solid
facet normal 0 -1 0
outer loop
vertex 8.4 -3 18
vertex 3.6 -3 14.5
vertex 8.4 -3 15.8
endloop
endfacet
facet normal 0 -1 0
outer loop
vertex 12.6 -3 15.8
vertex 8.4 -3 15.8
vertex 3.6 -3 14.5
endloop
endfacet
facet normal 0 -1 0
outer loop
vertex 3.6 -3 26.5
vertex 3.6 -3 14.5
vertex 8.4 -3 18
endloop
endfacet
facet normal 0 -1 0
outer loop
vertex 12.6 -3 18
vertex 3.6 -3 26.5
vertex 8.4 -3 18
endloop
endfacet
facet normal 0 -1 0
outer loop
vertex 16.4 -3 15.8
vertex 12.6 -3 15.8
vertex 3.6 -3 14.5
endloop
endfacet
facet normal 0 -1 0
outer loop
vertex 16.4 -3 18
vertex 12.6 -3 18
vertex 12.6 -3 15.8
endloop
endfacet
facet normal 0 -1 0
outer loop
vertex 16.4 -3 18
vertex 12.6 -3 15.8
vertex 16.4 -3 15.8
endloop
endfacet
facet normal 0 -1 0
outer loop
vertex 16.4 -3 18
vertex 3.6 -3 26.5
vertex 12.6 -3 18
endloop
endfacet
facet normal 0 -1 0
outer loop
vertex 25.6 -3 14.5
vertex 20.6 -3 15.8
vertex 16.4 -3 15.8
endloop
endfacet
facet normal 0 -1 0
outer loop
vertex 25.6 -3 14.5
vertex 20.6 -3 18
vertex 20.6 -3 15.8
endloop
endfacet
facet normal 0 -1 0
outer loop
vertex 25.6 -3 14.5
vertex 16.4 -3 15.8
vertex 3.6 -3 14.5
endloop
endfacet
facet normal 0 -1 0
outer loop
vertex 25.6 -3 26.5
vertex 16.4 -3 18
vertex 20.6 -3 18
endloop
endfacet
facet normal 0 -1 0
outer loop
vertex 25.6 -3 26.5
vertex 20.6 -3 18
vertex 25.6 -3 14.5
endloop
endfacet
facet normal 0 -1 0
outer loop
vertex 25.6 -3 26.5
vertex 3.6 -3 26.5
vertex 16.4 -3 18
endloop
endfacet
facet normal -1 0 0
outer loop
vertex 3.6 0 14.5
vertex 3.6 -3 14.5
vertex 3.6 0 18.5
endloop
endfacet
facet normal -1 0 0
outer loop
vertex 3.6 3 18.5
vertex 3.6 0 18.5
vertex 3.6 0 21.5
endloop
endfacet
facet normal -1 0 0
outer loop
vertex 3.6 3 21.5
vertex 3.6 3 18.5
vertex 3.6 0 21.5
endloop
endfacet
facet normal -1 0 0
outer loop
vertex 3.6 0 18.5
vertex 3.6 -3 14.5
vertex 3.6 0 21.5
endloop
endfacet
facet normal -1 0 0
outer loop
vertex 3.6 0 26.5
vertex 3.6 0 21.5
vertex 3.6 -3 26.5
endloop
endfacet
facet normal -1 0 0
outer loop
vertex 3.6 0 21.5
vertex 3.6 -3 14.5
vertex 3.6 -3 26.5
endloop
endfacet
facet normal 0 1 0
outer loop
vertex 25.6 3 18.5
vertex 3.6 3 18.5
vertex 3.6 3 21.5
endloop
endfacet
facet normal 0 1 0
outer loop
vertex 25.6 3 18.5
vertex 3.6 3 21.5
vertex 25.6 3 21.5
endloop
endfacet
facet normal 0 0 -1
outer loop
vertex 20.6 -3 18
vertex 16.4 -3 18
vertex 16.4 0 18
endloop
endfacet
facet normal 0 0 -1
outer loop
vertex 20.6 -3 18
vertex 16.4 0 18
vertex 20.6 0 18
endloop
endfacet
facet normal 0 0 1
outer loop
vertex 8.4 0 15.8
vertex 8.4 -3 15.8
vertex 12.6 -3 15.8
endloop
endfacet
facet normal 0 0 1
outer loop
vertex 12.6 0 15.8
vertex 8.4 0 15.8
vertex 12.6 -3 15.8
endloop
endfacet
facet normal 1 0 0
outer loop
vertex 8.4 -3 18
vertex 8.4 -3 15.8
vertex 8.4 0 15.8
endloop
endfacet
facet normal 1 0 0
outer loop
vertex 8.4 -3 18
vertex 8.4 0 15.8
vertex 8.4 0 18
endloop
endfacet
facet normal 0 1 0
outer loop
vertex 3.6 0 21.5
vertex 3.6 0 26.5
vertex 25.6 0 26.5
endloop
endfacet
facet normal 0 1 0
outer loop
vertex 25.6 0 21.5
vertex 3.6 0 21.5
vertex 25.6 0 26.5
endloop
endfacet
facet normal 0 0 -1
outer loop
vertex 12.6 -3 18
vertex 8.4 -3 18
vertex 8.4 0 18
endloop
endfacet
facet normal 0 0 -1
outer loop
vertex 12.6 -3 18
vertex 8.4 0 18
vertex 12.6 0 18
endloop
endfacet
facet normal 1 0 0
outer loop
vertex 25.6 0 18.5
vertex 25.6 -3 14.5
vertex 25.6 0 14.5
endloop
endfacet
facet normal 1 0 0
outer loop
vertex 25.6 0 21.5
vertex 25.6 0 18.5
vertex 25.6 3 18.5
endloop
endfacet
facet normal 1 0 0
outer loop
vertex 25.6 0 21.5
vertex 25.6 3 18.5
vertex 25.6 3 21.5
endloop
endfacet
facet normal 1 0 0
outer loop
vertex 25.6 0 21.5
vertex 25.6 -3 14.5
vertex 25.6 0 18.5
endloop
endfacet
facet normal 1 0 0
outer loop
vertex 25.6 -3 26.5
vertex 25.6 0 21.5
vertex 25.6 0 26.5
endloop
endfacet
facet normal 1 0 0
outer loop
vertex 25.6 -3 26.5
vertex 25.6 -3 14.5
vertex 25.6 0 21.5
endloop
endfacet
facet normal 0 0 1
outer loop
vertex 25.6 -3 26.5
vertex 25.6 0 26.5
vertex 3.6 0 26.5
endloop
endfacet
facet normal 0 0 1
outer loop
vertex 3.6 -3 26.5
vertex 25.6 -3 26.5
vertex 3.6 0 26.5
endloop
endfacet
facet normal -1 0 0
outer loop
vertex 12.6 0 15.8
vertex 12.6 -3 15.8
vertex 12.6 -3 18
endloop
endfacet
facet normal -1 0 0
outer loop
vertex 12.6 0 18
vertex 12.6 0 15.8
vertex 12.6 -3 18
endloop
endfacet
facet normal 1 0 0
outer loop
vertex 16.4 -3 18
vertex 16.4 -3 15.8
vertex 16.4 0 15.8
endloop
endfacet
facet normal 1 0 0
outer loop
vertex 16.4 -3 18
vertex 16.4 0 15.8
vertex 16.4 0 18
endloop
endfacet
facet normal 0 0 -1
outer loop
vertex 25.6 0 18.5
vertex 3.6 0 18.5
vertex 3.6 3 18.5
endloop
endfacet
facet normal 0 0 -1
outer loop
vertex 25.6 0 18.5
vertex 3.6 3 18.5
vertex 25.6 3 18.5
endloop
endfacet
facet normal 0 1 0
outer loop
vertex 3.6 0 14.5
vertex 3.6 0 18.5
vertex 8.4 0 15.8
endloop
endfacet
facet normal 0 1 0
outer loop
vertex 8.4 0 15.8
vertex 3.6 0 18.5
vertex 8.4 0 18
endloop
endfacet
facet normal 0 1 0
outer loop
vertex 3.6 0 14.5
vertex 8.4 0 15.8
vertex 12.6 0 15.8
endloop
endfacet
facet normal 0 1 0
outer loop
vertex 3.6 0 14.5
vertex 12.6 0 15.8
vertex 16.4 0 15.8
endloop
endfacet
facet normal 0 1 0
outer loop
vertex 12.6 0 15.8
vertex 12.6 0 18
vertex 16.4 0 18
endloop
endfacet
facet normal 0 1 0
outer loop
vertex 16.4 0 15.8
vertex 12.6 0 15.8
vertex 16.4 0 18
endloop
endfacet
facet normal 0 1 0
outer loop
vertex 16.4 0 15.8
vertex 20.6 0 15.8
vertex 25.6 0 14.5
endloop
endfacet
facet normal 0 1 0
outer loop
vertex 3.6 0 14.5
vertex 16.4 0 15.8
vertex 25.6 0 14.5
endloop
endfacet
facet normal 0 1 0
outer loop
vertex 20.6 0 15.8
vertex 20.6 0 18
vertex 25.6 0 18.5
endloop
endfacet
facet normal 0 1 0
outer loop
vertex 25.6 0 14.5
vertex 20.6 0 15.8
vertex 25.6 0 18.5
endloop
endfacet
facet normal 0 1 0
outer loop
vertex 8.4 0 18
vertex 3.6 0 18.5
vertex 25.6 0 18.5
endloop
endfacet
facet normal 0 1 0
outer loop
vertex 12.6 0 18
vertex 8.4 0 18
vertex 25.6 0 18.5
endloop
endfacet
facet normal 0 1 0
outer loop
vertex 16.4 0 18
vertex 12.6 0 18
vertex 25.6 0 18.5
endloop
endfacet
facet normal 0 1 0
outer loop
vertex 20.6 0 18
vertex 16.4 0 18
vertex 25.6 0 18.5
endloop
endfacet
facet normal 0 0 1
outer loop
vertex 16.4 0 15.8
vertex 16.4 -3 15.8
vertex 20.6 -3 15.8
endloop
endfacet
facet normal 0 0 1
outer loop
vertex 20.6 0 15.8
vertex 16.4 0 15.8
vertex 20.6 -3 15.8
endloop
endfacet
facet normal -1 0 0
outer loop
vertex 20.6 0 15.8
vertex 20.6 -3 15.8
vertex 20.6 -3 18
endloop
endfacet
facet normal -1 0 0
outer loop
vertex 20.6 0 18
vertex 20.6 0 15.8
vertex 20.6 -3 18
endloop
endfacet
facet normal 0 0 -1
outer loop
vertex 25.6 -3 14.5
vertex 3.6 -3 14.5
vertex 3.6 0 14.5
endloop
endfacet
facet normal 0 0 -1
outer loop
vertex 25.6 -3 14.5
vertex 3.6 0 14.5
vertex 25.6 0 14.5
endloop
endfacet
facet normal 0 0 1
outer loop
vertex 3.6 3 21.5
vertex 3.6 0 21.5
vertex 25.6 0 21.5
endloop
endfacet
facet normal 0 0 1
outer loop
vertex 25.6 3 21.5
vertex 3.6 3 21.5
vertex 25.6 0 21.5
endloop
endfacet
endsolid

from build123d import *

# Parameters (mm, degrees)
SKETCH_232_W          = 210
SKETCH_232_H          = 53
EXTRUDE_1_DEPTH       = 50
SKETCH_3_W            = 200
SKETCH_3_H            = 43
CUT_EXTRUDE_1_DEPTH   = 45
SKETCH_4_R            = 3.5
EXTRUDE_2_DEPTH       = 2
EXTRUDE_2_TAPER       = 1
FILLET_2_R            = 0.5
SKETCH_4_5_R          = 3.5
EXTRUDE_3_DEPTH       = 2
SKETCH_4_6_R          = 3.5
EXTRUDE_4_DEPTH       = 2
SKETCH_4_7_R          = 3.5
EXTRUDE_5_DEPTH       = 2
FILLET_3_R            = 0.5
FILLET_4_R            = 0.5
FILLET_5_R            = 0.5
SKETCH_7_R            = 6
CUT_EXTRUDE_2_DEPTH   = 14
CUT_EXTRUDE_2_DRAFT   = -5
FILLET_6_R            = 2
SKETCH_8_R            = 7
EXTRUDE_6_DEPTH       = 7
EXTRUDE_6_TAPER       = 5
SKETCH_9_R            = 5.15
CUT_EXTRUDE_3_DEPTH   = 7
CUT_EXTRUDE_3_DRAFT   = 5
SKETCH_10_W           = 29.4
SKETCH_10_H           = 26.3
CUT_EXTRUDE_4_DEPTH   = 5
SKETCH_13_W           = 39.2
SKETCH_13_H           = 27.5
CUT_EXTRUDE_5_DEPTH   = 2
SKETCH_14_W           = 6
SKETCH_14_H           = 6
CUT_EXTRUDE_6_DEPTH   = 5
FILLET_7_R            = 2
EXTRUDE_8_DEPTH       = 3
SKETCH_18_W           = 200
SKETCH_18_H           = 43
SKETCH_18_W_2         = 194
SKETCH_18_H_2         = 37
EXTRUDE_4672_DEPTH    = 3
SKETCH_21_W           = 4.2
SKETCH_21_H           = 2.2
CUT_EXTRUDE_7_DEPTH   = 3
SKETCH_23_OUTSIDE_W   = 255.334
SKETCH_23_OUTSIDE_H   = 98.334
SKETCH_23_OUTSIDE_W_2 = 22
SKETCH_23_OUTSIDE_H_2 = 12
CUT_EXTRUDE_8_DEPTH   = 6


with BuildPart() as part:
    # Sketch 232 → Бобышка-Вытянуть1 (new body)
    with BuildSketch(Plane(origin=(0, 0, 0), x_dir=(1, 0, 0), z_dir=(0, 1, 0))):
        Rectangle(SKETCH_232_W, SKETCH_232_H)
    extrude(amount=EXTRUDE_1_DEPTH)

    # Эскиз3 → Вырез-Вытянуть1 (cut)
    with BuildSketch(Plane.XZ):
        Rectangle(SKETCH_3_W, SKETCH_3_H)
    extrude(amount=-CUT_EXTRUDE_1_DEPTH, mode=Mode.SUBTRACT)

    # Эскиз4 → Бобышка-Вытянуть2 (add)
    with BuildSketch(Plane(origin=(0, 50, 0), x_dir=(1, 0, 0), z_dir=(0, 1, 0))):
        with Locations((98, 19.5)):
            Circle(SKETCH_4_R)
    extrude(amount=EXTRUDE_2_DEPTH, taper=EXTRUDE_2_TAPER)

    # Скругление2
    fillet_2_edges = [part.edges().sort_by_distance(p)[0] for p in [
        (94.53491013, 52, -19.5),
    ]]
    fillet(fillet_2_edges, radius=FILLET_2_R)

    # Эскиз4<5> → Бобышка-Вытянуть3 (add)
    with BuildSketch(Plane(origin=(0, 50, 0), x_dir=(1, 0, 0), z_dir=(0, 1, 0))):
        with Locations(Location((98, -19.5, 0), (0, 0, 90))):
            Circle(SKETCH_4_5_R)
    extrude(amount=EXTRUDE_3_DEPTH)

    # Эскиз4<6> → Бобышка-Вытянуть4 (add)
    with BuildSketch(Plane(origin=(0, 50, 0), x_dir=(1, 0, 0), z_dir=(0, 1, 0))):
        with Locations(Location((-98, -19.5, 0), (0, 0, 270))):
            Circle(SKETCH_4_6_R)
    extrude(amount=EXTRUDE_4_DEPTH)

    # Эскиз4<7> → Бобышка-Вытянуть5 (add)
    with BuildSketch(Plane(origin=(0, 50, 0), x_dir=(1, 0, 0), z_dir=(0, 1, 0))):
        with Locations(Location((-98, 19.5, 0), (0, 0, 90))):
            Circle(SKETCH_4_7_R)
    extrude(amount=EXTRUDE_5_DEPTH)

    # Скругление3
    fillet_3_edges = [part.edges().sort_by_distance(p)[0] for p in [
        (-98, 52, 16),
    ]]
    fillet(fillet_3_edges, radius=FILLET_3_R)

    # Скругление4
    fillet_4_edges = [part.edges().sort_by_distance(p)[0] for p in [
        (-98, 52, -16),
    ]]
    fillet(fillet_4_edges, radius=FILLET_4_R)

    # Скругление5
    fillet_5_edges = [part.edges().sort_by_distance(p)[0] for p in [
        (98, 52, 23),
    ]]
    fillet(fillet_5_edges, radius=FILLET_5_R)


with BuildPart() as cut_extrude_2_tool:
    # Эскиз7 → Вырез-Вытянуть2 (with draft: the straight prism first)
    with BuildSketch(Plane(origin=(0, 0, -26.5), x_dir=(-1, 0, 0), z_dir=(0, 0, -1))):
        with Locations((0, 35.081888724)):
            Circle(SKETCH_7_R)
    extrude(amount=-CUT_EXTRUDE_2_DEPTH)
    # Вырез-Вытянуть2: the draft: its side faces are tilted about the plane it starts from
    cut_extrude_2_sides = [cut_extrude_2_tool.faces().sort_by_distance(p)[0] for p in [
        (6, 35.081888724, -19.5),
    ]]
    draft(cut_extrude_2_sides, Plane(origin=(0, 0, -26.5), x_dir=(-1, 0, 0), z_dir=(0, 0, -1)), CUT_EXTRUDE_2_DRAFT)


with BuildPart() as part_1:
    add(part.part)

    # Вырез-Вытянуть2: cut by cut_extrude_2_tool
    add(cut_extrude_2_tool.part, mode=Mode.SUBTRACT)

    # Скругление6
    fillet_6_edges = [part_1.edges().sort_by_distance(p)[0] for p in [
        (6, 35.081888724, -26.5),
    ]]
    fillet(fillet_6_edges, radius=FILLET_6_R)

    # Эскиз8 → Бобышка-Вытянуть6 (add)
    with BuildSketch(Plane.XY.offset(-21.5)):
        with Locations((0, 35.081888724)):
            Circle(SKETCH_8_R)
    extrude(amount=EXTRUDE_6_DEPTH, taper=EXTRUDE_6_TAPER)


with BuildPart() as cut_extrude_3_tool:
    # Эскиз9 → Вырез-Вытянуть3 (with draft: the straight prism first)
    with BuildSketch(Plane.XY.offset(-14.5)):
        with Locations((0, 35.081888724)):
            Circle(SKETCH_9_R)
    extrude(amount=-CUT_EXTRUDE_3_DEPTH)
    # Вырез-Вытянуть3: the draft: its side faces are tilted about the plane it starts from
    cut_extrude_3_sides = [cut_extrude_3_tool.faces().sort_by_distance(p)[0] for p in [
        (-5.15, 35.081888724, -18),
    ]]
    draft(cut_extrude_3_sides, Plane.XY.offset(-14.5), CUT_EXTRUDE_3_DRAFT)


with BuildPart() as part_2:
    add(part_1.part)

    # Вырез-Вытянуть3: cut by cut_extrude_3_tool
    add(cut_extrude_3_tool.part, mode=Mode.SUBTRACT)

    # Эскиз10 → Вырез-Вытянуть4 (cut)
    with BuildSketch(Plane.XY.offset(26.5)):
        with Locations((-50, 25)):
            Rectangle(SKETCH_10_W, SKETCH_10_H)
    extrude(amount=-CUT_EXTRUDE_4_DEPTH, mode=Mode.SUBTRACT)

    # Эскиз13 → Вырез-Вытянуть5 (cut)
    with BuildSketch(Plane(origin=(0, 0, 21.5), x_dir=(-1, 0, 0), z_dir=(0, 0, -1))):
        with Locations((50, 25)):
            Rectangle(SKETCH_13_W, SKETCH_13_H)
    extrude(amount=-CUT_EXTRUDE_5_DEPTH, mode=Mode.SUBTRACT)

    # Эскиз14 → Вырез-Вытянуть6 (cut)
    with BuildSketch(Plane.XY.offset(26.5)):
        with Locations((-76.5, 31.8)):
            Rectangle(SKETCH_14_W, SKETCH_14_H)
        with Locations((-76.5, 18.2)):
            Rectangle(SKETCH_14_W, SKETCH_14_H)
    extrude(amount=-CUT_EXTRUDE_6_DEPTH, mode=Mode.SUBTRACT)

    # Скругление7
    fillet_7_edges = [part_2.edges().sort_by_distance(p)[0] for p in [
        (-105, 50, 0),
        (0, 50, 26.5),
        (105, 50, 0),
        (105, 25, 26.5),
        (-105, 25, 26.5),
        (-105, 25, -26.5),
        (105, 25, -26.5),
        (0, 50, -26.5),
    ]]
    fillet(fillet_7_edges, radius=FILLET_7_R)


with BuildPart() as body_2:
    # Эскиз17 → Бобышка-Вытянуть8 (new body)
    with BuildSketch(Plane.XZ):
        with BuildLine():
            Line((-105, 24.5), (-105, -24.5))
            ThreePointArc((-105, -24.5), (-104.414213562, -25.914213562), (-103, -26.5))
            Line((-103, -26.5), (103, -26.5))
            ThreePointArc((103, -26.5), (104.414213562, -25.914213562), (105, -24.5))
            Line((105, -24.5), (105, 24.5))
            ThreePointArc((105, 24.5), (104.414213562, 25.914213562), (103, 26.5))
            Line((103, 26.5), (-103, 26.5))
            ThreePointArc((-103, 26.5), (-104.414213562, 25.914213562), (-105, 24.5))
        make_face()
    extrude(amount=EXTRUDE_8_DEPTH)

    # Эскиз18 → Extrude 4672 (add)
    with BuildSketch(Plane(origin=(0, 0, 0), x_dir=(1, 0, 0), z_dir=(0, 1, 0))):
        Rectangle(SKETCH_18_W, SKETCH_18_H)
        Rectangle(SKETCH_18_W_2, SKETCH_18_H_2, mode=Mode.SUBTRACT)
    extrude(amount=EXTRUDE_4672_DEPTH)

    # Эскиз21 → Вырез-Вытянуть7 (cut)
    with BuildSketch(Plane.XZ.offset(3)):
        with Locations((10.5, 16.9)):
            Rectangle(SKETCH_21_W, SKETCH_21_H)
        with Locations((18.5, 16.9)):
            Rectangle(SKETCH_21_W, SKETCH_21_H)
    extrude(amount=-CUT_EXTRUDE_7_DEPTH, mode=Mode.SUBTRACT)

    # Эскиз23 outside → Вырез-Вытянуть8 (cut)
    with BuildSketch(Plane.XZ.offset(3)):
        Rectangle(SKETCH_23_OUTSIDE_W, SKETCH_23_OUTSIDE_H)
        with Locations((14.6, 20.5)):
            Rectangle(SKETCH_23_OUTSIDE_W_2, SKETCH_23_OUTSIDE_H_2, mode=Mode.SUBTRACT)
    extrude(amount=-CUT_EXTRUDE_8_DEPTH, mode=Mode.SUBTRACT)


solid = body_2.part
